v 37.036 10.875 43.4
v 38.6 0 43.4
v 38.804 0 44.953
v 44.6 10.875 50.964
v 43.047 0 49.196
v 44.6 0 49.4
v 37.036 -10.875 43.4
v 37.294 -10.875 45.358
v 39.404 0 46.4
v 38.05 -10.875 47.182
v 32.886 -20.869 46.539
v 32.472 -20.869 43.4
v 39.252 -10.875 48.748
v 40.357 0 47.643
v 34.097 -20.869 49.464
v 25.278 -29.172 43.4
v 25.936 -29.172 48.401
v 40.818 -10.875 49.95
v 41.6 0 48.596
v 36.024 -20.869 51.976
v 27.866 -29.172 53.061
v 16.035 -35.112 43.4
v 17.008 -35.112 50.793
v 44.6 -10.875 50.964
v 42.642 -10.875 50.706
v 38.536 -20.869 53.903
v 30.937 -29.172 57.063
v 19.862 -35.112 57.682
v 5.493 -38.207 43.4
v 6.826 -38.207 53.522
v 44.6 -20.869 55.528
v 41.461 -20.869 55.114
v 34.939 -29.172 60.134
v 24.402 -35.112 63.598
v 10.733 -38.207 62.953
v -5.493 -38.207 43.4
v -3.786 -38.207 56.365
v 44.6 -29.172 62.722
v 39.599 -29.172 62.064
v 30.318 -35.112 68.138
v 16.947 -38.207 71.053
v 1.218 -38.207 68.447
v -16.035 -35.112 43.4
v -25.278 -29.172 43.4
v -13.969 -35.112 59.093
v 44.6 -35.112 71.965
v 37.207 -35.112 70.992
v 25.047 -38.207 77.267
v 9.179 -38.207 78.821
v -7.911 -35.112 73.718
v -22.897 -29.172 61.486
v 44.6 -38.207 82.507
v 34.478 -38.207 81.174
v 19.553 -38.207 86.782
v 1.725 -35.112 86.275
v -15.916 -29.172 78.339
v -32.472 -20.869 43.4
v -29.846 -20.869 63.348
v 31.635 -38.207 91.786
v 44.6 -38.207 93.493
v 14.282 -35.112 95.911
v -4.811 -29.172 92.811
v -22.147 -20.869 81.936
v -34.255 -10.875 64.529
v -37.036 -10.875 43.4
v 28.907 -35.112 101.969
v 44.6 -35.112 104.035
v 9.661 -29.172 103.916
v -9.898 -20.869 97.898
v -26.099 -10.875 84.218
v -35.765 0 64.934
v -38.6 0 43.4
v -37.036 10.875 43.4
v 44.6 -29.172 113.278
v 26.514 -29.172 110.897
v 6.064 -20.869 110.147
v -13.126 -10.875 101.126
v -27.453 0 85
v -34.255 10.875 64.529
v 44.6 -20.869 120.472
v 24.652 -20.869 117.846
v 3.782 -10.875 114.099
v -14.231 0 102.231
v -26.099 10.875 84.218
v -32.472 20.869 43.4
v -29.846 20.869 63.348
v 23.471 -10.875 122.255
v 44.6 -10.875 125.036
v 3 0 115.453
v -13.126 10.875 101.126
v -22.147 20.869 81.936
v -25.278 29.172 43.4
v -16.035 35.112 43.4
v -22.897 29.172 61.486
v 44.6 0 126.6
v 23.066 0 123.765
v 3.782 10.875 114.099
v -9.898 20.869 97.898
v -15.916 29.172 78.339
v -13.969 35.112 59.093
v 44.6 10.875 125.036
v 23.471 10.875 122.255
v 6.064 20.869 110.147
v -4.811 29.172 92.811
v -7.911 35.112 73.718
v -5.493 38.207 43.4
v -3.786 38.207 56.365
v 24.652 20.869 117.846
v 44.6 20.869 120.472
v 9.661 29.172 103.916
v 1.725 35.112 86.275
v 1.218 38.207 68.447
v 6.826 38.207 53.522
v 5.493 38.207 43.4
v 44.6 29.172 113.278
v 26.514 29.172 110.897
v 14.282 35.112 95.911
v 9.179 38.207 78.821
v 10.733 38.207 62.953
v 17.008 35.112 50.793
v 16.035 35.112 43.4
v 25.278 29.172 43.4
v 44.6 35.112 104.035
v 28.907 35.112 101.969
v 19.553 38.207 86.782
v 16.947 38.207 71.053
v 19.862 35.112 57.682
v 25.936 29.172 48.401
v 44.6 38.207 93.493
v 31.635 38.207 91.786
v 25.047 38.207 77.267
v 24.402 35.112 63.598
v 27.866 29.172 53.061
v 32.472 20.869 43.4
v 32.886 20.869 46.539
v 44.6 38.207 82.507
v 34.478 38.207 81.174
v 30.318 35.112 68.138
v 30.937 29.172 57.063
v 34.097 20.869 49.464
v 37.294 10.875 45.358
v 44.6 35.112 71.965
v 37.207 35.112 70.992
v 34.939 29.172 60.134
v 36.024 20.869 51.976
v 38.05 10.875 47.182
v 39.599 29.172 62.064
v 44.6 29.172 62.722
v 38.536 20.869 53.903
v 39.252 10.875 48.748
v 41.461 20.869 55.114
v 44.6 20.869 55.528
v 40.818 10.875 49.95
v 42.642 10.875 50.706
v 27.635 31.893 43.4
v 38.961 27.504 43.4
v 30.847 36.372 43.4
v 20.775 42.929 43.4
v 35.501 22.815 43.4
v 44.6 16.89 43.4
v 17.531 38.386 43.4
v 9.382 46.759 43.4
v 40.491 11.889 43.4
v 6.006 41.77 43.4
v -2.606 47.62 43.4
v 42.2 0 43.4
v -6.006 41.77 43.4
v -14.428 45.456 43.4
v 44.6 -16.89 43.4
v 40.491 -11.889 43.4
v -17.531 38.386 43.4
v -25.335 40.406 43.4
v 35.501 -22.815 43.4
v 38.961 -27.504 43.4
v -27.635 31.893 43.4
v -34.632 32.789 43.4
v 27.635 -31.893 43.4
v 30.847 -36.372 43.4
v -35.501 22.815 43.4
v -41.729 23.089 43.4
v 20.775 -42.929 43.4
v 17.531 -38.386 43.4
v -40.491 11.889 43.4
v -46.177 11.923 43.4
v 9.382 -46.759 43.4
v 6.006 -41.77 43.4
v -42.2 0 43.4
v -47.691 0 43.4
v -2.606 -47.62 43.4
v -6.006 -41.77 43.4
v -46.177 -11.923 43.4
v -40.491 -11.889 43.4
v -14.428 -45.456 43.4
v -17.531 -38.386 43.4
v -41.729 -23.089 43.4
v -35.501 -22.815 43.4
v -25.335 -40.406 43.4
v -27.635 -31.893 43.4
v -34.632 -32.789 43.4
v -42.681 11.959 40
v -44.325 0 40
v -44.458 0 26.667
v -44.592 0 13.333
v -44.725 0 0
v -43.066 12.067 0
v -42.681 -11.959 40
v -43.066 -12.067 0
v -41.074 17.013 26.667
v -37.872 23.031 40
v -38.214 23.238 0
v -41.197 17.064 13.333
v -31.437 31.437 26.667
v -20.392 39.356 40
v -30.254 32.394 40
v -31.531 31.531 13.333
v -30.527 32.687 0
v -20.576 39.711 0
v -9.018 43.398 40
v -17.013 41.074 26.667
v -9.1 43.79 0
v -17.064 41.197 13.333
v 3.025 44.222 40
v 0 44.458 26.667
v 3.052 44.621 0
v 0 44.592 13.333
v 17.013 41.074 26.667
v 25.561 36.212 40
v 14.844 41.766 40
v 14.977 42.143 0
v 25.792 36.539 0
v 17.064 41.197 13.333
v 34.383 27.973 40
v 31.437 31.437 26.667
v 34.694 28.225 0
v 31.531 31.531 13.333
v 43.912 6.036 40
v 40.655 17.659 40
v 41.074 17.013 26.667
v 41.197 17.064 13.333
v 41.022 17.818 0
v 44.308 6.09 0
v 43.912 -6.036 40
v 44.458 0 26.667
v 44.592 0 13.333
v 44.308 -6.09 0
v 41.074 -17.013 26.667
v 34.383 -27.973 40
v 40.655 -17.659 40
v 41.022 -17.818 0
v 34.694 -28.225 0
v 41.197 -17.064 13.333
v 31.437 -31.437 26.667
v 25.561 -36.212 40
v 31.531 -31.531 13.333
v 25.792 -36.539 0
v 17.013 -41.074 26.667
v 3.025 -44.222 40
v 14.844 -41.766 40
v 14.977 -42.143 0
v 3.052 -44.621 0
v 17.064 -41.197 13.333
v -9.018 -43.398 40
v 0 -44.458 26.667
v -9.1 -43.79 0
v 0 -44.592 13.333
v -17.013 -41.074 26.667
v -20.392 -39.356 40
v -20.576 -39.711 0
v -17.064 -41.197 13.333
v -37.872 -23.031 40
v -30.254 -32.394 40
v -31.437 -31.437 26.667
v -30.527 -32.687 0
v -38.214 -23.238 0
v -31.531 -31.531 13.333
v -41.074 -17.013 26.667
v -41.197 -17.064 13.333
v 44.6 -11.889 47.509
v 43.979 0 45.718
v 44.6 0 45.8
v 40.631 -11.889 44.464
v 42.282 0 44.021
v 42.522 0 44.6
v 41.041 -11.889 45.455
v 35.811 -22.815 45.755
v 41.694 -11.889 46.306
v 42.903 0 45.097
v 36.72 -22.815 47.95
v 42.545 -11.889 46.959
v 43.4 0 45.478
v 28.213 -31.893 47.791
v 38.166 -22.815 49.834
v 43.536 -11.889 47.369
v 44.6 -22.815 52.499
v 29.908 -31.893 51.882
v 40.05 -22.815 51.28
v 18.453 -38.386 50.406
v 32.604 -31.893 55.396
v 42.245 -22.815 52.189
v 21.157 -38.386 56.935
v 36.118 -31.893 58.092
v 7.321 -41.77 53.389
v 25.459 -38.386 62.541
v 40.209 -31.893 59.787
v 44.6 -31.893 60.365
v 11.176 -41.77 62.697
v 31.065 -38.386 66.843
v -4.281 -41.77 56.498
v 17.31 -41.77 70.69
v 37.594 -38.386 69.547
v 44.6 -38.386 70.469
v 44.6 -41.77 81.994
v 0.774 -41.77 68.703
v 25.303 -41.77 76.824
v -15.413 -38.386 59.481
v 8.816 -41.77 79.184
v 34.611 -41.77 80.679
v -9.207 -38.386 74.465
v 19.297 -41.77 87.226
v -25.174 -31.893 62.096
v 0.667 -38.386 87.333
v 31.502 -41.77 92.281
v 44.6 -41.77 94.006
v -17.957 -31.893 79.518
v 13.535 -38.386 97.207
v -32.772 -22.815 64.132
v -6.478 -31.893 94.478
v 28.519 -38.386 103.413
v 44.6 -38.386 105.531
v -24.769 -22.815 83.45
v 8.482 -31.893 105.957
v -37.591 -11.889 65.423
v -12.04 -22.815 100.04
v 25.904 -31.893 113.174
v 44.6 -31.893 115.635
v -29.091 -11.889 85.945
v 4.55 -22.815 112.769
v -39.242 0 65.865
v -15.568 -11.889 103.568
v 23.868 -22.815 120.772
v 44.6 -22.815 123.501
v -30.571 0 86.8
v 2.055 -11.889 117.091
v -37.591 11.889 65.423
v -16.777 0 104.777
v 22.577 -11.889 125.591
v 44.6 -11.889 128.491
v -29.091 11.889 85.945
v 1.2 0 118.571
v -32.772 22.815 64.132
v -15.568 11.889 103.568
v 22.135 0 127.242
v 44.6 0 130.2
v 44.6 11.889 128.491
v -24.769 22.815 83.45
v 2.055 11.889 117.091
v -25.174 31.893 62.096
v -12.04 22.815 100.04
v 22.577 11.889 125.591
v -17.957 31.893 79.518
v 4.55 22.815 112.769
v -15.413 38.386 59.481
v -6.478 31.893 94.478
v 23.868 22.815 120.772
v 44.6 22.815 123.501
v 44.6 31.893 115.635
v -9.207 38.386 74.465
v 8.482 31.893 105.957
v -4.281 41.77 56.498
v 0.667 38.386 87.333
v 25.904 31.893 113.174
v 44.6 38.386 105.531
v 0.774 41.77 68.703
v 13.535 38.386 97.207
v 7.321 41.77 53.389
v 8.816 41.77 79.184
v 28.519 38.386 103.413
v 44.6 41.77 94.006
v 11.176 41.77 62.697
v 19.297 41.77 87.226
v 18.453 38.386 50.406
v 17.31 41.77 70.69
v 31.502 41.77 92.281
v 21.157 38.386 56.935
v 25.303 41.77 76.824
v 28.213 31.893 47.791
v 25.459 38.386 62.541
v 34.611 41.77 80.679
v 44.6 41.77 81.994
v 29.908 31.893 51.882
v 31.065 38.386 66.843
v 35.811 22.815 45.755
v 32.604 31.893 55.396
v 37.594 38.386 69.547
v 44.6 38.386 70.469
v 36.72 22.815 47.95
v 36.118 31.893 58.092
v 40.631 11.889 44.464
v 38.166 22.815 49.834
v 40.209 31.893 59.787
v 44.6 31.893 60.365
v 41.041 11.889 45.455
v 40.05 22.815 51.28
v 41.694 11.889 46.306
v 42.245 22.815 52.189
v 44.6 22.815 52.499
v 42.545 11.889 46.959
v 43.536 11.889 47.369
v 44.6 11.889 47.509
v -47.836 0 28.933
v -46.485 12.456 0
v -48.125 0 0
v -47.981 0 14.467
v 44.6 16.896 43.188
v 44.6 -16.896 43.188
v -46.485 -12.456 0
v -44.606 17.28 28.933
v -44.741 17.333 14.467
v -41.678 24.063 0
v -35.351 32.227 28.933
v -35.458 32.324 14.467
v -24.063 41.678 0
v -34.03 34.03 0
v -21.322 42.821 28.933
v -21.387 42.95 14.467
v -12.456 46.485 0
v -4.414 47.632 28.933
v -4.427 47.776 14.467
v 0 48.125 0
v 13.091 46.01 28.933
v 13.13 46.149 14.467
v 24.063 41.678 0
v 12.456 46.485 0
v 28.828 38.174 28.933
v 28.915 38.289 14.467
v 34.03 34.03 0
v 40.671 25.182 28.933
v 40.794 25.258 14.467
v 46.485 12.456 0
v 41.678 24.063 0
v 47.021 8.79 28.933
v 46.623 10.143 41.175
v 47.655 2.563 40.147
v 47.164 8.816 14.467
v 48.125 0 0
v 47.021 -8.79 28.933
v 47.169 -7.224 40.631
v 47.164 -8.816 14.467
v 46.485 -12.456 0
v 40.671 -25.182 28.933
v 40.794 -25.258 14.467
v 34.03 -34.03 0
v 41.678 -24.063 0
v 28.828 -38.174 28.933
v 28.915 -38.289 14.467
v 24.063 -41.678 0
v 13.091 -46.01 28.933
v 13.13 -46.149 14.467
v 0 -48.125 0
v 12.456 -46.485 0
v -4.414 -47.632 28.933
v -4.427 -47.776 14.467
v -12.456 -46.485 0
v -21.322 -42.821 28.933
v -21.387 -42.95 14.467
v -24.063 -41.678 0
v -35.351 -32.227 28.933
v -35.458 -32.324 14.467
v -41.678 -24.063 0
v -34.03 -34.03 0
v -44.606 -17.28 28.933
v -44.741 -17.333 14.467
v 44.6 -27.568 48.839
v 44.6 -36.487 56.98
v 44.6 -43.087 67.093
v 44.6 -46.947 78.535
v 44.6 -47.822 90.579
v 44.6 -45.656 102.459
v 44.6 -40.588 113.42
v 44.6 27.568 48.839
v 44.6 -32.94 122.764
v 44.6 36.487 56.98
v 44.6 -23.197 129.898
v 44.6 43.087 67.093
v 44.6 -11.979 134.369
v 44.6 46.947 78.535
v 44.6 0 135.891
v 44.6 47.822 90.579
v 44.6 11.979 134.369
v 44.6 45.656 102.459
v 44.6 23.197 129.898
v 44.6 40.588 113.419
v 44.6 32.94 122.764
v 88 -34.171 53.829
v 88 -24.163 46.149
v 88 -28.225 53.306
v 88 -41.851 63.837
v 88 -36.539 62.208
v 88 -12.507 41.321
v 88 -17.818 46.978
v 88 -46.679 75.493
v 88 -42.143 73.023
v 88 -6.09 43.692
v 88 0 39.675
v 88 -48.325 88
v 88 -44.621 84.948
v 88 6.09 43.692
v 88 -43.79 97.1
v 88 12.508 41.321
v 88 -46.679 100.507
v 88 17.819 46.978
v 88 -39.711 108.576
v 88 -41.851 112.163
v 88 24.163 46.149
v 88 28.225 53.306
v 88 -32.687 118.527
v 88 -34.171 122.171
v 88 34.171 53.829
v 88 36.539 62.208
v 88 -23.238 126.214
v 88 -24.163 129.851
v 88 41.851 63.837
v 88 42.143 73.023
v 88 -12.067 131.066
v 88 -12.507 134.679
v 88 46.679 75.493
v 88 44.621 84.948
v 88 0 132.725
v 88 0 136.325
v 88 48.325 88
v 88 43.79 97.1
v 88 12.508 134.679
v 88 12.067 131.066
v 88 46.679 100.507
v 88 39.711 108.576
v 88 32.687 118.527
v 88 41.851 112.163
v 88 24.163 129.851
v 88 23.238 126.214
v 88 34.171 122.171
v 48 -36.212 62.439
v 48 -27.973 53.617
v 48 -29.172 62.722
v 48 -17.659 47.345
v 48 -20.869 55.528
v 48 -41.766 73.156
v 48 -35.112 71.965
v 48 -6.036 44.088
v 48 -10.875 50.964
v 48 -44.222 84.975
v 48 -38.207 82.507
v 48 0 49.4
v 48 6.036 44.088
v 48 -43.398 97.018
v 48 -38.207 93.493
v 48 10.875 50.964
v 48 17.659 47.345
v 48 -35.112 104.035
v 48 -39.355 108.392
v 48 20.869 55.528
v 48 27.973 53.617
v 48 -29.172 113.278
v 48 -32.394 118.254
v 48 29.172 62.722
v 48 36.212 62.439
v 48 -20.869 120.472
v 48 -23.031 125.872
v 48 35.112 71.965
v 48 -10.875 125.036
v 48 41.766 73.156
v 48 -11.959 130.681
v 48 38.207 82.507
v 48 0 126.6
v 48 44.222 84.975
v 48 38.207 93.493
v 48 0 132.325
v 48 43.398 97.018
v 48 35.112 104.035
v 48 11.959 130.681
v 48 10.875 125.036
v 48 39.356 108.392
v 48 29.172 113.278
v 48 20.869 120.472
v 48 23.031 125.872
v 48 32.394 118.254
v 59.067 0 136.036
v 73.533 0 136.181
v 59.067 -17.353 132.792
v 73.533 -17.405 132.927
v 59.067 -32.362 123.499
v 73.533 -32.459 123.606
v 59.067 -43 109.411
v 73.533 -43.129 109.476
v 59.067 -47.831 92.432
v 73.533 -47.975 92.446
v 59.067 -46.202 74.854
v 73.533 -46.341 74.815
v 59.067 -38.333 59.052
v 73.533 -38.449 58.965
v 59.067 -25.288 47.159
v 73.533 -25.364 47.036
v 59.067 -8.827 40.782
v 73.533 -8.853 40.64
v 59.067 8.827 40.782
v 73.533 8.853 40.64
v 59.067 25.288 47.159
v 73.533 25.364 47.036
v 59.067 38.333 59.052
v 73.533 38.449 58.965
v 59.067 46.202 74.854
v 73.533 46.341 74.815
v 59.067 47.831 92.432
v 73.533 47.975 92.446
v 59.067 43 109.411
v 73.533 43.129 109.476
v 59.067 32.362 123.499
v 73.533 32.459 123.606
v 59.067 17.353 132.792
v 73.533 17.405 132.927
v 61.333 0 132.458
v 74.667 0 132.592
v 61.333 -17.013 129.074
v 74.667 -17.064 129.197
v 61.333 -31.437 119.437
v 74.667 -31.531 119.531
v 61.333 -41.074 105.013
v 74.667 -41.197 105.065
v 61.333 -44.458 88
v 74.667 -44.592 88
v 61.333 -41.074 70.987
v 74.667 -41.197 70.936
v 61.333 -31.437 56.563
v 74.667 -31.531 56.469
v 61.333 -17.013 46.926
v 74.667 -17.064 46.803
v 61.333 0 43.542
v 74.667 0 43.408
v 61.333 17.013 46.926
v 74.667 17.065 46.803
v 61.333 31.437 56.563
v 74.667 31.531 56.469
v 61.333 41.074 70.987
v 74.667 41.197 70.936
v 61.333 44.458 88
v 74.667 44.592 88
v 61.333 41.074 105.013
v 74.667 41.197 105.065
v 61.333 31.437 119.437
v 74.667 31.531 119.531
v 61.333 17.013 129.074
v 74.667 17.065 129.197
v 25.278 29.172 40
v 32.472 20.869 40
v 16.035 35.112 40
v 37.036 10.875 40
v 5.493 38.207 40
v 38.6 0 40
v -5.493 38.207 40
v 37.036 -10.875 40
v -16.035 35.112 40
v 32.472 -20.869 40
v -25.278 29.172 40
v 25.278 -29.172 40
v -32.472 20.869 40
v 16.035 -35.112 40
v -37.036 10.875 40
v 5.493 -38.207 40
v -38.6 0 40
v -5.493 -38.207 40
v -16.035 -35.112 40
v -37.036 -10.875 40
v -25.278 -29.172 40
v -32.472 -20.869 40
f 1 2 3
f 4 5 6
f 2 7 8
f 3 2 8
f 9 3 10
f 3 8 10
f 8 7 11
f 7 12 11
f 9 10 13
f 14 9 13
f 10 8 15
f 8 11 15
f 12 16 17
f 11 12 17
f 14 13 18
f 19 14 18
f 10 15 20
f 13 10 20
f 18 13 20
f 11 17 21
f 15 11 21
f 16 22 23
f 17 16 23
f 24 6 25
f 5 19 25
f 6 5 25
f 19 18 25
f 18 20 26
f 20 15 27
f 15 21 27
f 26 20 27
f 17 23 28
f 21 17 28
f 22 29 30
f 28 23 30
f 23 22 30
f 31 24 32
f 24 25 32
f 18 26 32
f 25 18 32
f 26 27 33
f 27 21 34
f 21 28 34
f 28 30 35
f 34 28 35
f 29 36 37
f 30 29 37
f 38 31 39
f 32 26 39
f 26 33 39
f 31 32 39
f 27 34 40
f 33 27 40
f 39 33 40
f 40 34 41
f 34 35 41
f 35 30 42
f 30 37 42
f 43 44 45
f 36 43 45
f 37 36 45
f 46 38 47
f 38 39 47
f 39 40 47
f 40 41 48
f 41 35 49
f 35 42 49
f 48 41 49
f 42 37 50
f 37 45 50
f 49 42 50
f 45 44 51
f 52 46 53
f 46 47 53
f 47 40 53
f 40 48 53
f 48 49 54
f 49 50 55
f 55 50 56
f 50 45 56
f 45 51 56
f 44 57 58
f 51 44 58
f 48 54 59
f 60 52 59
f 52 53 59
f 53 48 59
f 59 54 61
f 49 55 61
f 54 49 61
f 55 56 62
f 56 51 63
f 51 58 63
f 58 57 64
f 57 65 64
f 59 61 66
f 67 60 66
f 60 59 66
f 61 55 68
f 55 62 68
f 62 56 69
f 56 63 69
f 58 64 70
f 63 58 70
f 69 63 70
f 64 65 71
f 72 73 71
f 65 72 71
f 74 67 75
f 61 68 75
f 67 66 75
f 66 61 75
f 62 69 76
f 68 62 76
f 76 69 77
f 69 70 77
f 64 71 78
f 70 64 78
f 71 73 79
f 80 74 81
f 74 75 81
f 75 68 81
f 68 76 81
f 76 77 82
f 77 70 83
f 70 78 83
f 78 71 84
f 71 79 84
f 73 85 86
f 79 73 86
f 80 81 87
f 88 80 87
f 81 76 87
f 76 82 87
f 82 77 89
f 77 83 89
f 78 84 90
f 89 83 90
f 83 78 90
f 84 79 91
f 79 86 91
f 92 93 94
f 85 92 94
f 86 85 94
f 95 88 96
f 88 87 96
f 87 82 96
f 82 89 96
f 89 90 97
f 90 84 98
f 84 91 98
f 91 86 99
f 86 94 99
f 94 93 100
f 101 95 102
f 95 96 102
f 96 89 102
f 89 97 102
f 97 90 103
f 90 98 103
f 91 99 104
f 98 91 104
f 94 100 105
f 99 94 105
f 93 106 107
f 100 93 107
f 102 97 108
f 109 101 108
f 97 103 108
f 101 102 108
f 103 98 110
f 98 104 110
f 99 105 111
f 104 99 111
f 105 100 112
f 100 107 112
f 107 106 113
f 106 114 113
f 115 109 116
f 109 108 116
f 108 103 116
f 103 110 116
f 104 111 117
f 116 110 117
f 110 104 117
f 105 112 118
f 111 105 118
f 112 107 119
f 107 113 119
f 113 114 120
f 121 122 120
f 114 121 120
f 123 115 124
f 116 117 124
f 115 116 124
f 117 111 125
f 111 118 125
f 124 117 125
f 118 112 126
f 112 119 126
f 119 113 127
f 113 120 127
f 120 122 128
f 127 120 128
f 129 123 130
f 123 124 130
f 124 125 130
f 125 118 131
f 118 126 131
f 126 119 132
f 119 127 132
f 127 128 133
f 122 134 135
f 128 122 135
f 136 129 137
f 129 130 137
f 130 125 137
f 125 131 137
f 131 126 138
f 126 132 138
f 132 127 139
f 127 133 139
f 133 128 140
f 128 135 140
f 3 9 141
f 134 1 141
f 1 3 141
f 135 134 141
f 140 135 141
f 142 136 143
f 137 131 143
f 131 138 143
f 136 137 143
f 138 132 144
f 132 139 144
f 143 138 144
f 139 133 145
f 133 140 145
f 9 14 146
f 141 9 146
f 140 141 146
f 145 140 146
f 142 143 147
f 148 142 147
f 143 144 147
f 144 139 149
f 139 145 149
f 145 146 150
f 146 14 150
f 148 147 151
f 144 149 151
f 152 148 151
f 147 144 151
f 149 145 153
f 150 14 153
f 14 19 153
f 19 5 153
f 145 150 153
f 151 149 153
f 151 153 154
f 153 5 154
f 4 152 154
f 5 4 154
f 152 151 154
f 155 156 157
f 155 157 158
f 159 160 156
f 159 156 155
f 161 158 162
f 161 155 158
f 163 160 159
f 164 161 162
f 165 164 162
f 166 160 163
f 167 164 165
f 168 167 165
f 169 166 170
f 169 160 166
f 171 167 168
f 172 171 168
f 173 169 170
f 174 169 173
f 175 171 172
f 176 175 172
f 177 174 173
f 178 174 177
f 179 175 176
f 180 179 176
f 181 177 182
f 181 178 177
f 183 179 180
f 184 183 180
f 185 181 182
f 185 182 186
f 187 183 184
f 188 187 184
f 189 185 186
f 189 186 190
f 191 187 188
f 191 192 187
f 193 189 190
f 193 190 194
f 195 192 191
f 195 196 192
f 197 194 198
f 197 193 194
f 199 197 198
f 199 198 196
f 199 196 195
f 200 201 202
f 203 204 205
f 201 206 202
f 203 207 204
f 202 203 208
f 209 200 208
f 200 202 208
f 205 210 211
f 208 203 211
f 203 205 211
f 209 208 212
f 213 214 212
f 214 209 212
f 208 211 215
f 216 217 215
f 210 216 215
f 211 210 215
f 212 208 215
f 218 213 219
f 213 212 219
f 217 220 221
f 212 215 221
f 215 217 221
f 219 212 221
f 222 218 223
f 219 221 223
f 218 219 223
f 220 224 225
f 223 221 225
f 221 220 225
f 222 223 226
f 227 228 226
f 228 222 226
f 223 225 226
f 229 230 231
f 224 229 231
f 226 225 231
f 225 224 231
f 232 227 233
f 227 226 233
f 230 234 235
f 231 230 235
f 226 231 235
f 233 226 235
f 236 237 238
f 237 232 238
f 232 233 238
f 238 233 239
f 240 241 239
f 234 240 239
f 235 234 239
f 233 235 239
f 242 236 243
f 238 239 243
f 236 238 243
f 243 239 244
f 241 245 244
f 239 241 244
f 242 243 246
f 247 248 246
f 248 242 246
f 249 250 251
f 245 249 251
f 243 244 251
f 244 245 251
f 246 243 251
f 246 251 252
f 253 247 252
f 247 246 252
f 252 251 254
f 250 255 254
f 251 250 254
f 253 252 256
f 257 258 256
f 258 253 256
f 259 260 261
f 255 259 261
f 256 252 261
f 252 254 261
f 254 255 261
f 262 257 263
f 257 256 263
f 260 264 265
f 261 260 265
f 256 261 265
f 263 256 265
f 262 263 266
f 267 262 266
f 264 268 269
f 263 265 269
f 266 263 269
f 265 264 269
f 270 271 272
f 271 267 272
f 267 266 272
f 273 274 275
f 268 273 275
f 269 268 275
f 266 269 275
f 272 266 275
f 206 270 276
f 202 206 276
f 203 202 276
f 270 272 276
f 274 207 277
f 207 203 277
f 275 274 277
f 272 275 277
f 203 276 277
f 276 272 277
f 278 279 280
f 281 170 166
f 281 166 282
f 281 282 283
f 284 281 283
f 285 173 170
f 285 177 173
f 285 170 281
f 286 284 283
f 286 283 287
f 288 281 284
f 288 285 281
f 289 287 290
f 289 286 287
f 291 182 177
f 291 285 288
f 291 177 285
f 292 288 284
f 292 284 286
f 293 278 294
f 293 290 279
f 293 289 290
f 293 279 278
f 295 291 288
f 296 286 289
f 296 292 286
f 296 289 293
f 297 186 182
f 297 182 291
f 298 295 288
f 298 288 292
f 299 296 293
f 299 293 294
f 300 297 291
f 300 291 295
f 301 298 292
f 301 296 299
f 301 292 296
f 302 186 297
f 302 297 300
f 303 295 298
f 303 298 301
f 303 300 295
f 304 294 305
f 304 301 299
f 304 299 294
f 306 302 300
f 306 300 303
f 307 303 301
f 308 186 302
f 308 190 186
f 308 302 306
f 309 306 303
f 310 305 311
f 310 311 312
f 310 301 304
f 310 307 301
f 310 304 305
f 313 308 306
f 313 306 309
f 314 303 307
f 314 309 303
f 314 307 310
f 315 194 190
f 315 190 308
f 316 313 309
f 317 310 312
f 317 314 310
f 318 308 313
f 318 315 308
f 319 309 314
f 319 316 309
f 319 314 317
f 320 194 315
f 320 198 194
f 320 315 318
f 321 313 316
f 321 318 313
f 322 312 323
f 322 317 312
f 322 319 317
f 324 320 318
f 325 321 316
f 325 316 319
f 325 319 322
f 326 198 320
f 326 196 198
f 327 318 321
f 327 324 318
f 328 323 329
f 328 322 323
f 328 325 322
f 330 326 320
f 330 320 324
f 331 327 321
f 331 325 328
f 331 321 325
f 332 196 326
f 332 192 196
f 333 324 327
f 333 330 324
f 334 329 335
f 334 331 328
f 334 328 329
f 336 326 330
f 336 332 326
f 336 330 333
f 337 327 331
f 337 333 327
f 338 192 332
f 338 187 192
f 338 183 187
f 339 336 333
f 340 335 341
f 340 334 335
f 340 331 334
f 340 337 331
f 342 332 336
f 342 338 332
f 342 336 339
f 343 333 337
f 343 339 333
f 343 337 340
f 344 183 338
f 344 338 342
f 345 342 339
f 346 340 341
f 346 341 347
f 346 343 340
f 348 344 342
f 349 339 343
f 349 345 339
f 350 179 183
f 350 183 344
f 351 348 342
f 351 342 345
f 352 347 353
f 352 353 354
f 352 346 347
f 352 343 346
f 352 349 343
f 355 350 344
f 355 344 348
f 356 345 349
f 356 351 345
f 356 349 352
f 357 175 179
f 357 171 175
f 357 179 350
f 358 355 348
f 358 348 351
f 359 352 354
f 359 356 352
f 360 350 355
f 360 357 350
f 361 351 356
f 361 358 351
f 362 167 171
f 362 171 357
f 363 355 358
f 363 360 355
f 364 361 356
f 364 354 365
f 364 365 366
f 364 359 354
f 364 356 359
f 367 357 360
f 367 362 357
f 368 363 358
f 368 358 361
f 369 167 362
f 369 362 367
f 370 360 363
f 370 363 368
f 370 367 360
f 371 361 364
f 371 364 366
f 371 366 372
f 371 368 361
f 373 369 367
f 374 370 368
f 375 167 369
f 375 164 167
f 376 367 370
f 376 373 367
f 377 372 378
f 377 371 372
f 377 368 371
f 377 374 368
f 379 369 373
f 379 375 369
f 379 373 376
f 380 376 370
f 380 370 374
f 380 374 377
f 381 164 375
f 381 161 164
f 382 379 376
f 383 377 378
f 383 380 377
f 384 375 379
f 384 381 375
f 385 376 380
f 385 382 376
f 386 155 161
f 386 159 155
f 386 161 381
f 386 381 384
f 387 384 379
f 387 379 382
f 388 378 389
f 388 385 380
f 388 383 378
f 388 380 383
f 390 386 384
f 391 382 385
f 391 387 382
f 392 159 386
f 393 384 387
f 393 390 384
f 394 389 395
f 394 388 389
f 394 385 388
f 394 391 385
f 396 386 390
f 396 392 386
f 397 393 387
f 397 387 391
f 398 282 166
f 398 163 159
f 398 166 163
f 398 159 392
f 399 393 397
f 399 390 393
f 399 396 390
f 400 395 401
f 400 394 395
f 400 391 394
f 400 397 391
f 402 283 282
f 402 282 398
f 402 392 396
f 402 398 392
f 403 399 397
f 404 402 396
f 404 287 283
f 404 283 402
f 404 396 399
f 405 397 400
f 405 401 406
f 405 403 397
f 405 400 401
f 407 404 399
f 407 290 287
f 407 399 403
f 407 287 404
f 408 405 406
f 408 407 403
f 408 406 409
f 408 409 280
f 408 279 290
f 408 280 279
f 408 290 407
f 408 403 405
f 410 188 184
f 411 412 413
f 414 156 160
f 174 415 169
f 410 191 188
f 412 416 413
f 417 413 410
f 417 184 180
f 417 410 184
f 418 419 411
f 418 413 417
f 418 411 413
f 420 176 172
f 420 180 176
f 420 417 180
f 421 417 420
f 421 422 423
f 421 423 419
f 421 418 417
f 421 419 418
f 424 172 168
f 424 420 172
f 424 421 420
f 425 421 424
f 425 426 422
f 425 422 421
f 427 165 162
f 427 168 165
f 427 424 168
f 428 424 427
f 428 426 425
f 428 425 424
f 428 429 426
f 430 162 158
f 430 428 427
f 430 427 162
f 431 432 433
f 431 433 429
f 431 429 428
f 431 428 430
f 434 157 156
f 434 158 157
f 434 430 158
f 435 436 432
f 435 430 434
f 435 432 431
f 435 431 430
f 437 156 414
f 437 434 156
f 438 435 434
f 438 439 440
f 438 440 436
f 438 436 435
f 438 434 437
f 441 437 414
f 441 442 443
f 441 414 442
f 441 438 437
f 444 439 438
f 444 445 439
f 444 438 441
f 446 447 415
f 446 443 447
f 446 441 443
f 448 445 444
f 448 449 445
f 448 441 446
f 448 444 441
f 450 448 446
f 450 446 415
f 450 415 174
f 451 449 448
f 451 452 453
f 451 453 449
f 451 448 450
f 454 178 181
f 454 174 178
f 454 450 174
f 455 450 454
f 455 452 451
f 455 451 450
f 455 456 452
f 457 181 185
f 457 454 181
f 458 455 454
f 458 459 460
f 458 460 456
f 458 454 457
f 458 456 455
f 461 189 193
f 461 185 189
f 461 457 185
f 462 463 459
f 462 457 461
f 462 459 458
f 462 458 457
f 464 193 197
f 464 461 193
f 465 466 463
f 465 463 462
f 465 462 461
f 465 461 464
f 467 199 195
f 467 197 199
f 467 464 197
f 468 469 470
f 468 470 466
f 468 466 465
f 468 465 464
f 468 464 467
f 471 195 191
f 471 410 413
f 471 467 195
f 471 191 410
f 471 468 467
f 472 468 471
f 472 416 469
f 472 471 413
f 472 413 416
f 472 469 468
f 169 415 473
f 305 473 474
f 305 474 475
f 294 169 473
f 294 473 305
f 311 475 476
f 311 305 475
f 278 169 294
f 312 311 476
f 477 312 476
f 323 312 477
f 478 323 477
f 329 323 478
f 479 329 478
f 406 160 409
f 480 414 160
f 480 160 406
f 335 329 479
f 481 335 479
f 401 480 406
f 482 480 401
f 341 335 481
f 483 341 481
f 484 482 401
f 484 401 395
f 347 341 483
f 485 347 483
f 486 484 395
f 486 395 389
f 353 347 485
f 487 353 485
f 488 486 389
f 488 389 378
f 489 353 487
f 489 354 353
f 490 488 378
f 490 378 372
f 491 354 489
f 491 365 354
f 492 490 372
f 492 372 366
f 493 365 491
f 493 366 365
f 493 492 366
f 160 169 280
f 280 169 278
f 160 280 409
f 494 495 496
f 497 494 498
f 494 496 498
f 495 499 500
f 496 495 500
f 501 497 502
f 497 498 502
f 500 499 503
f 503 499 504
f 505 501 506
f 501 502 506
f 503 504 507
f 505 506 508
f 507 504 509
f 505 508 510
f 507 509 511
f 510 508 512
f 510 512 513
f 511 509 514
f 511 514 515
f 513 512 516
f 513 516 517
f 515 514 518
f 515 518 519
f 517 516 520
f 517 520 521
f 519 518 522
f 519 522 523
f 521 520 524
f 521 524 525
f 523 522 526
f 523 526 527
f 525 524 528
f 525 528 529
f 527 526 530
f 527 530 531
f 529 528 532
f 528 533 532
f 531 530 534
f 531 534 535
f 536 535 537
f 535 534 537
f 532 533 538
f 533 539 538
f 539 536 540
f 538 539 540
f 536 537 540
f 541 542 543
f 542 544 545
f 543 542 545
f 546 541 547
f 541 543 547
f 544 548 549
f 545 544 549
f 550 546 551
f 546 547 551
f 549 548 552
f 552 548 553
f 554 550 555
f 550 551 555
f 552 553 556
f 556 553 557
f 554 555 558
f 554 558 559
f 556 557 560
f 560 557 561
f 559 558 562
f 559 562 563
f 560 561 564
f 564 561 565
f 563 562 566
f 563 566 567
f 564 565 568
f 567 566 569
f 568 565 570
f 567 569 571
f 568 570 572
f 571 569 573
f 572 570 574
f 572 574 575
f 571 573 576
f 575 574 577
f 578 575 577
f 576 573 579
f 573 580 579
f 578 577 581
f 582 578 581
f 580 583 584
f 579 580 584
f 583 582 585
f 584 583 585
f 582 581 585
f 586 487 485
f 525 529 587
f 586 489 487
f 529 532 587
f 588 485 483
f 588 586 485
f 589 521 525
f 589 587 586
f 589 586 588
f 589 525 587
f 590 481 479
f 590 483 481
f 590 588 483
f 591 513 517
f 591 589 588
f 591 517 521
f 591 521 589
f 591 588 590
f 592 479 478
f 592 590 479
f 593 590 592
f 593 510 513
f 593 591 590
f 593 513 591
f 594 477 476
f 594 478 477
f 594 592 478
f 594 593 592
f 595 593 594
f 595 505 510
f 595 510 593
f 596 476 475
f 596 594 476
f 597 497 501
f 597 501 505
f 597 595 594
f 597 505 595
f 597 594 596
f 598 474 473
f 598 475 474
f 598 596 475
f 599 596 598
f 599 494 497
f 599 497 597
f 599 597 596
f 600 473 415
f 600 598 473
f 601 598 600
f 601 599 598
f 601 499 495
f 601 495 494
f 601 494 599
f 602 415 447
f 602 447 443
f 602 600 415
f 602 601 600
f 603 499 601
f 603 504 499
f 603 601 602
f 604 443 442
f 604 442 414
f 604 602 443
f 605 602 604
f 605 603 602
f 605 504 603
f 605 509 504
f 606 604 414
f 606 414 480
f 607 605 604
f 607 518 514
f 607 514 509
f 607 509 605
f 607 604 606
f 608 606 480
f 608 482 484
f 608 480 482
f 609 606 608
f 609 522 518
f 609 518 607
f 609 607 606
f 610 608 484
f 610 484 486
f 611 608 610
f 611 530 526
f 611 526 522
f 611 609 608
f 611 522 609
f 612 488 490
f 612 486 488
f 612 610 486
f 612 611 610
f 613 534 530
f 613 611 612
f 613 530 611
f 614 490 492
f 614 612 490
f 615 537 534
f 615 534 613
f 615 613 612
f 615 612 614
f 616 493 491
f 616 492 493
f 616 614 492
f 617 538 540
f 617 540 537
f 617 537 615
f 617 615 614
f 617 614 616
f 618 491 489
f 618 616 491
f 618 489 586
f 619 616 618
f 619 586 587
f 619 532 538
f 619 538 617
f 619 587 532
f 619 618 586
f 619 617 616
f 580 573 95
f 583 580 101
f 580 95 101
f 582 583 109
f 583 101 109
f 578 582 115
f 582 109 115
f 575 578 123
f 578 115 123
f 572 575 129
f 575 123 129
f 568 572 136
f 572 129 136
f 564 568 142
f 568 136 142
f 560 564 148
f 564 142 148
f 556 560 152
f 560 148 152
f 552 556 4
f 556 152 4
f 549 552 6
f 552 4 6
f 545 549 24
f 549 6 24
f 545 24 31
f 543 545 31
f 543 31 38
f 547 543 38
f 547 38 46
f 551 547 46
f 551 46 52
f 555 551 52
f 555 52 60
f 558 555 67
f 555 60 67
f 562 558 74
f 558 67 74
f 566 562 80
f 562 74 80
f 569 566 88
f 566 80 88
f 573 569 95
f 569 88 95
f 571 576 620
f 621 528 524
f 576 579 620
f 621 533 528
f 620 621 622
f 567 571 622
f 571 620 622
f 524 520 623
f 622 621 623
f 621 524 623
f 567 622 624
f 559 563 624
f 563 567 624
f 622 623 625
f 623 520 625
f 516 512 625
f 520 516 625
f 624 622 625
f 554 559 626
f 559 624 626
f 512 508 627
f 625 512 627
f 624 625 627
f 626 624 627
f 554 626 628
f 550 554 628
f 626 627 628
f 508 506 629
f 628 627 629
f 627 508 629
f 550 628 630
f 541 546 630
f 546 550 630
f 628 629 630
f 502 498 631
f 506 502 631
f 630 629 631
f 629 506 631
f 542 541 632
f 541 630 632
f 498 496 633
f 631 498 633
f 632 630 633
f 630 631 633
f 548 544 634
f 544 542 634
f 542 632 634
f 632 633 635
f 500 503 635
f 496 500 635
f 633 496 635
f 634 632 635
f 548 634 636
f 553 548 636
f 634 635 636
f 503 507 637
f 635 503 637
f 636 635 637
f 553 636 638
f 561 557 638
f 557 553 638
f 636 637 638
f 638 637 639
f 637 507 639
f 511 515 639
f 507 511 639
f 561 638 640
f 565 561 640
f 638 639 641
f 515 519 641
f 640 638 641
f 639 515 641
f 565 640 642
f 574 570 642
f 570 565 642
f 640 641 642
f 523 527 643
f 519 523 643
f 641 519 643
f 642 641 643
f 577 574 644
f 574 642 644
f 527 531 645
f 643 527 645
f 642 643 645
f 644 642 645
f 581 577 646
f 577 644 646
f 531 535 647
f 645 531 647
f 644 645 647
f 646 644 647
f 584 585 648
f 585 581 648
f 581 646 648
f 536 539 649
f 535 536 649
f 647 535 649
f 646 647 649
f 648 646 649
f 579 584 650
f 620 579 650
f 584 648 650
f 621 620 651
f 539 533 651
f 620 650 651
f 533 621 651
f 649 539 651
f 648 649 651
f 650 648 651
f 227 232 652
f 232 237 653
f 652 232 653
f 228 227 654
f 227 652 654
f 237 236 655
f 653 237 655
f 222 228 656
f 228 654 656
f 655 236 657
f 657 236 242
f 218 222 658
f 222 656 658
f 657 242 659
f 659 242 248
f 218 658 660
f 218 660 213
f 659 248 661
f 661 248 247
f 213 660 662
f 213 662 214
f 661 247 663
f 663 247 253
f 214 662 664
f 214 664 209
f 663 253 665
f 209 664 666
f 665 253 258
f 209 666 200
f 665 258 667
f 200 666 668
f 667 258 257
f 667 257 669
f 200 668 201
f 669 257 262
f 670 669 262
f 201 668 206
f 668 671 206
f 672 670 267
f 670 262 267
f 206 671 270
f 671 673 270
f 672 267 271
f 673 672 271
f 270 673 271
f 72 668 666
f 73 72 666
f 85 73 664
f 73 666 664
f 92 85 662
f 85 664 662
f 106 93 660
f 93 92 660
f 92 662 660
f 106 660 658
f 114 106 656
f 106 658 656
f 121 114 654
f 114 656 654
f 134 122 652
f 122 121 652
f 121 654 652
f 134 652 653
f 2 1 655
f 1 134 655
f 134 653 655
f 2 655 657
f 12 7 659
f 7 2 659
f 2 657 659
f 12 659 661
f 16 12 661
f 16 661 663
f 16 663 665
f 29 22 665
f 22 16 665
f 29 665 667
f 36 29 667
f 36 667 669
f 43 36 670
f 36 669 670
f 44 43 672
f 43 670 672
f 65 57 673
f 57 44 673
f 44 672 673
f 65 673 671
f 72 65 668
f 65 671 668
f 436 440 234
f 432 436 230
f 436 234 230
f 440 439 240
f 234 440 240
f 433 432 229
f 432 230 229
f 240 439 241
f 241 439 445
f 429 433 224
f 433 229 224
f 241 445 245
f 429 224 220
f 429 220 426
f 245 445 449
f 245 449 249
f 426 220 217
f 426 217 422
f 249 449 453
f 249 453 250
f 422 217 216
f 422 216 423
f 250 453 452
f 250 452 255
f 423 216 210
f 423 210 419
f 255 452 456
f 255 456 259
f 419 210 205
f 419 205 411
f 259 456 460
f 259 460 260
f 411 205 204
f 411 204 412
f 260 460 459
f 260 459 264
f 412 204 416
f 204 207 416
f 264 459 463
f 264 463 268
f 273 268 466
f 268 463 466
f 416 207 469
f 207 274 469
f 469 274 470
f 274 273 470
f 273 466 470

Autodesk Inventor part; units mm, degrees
ref_plane "YZ Plane" through (0, 0, 0) normal (1, 0, 0) x (0, 1, 0)
ref_plane "XZ Plane" through (0, 0, 0) normal (0, 1, 0) x (-1, 0, 0)
ref_plane "XY Plane" through (0, 0, 0) normal (0, 0, 1) x (1, 0, 0)
sketch "Sketch1" plane through (0, 0, 0) normal (0, 1, 0) x (-1, 0, 0)
  line L0 (0, 0) -> (0, 43.4)
  line L1 (48.1252, 0) -> (0, 0)
  line L2 (0, 43.4) -> (47.6912, 43.4)
  line L3 (44.325, 40) -> (44.725, 0)
  line L4 (48.1252, 0) -> (47.6912, 43.4)
  line L5 (38.6, 43.4) -> (38.6, 40)
  line L6 (38.6, 40) -> (44.325, 40)
  line L7 (38.6, 40) -> (0, 40) construction
  dimension "d0" = 89.45
  dimension "d3" = 88.65
  dimension "d4" = 3.4
  dimension "d5" = 40
  dimension "d6" = 3.4
  dimension "d7" = 77.2
revolve "Revolution1" add sketch "Sketch1" angle 360 about axis through (0, 0, 0) along (0, 0, 1) contours L3 L6 L5 L2 L4 L1
sketch "Sketch2" plane through (0, 0, 43.4) normal (0, 0, 1) x (1, 0, 0)
  circle A0 centre (0, 0) radius 47.6912 projected
  circle A1 centre (0, 0) radius 38.6 projected
  circle A2 centre (0, 0) radius 42.2
  circle A3 centre (0, 0) radius 38.6
  dimension "d8" = 77.2
  dimension "d9" = 3.6
sketch "Sketch3" plane through (0, 0, 0) normal (0, 1, 0) x (-1, 0, 0)
  arc A0 (0, 43.4) -> (-44.6, 88) centre (-44.6, 43.4) ccw
  dimension "d10" = 44.6
  dimension "d11" = 44.6
  dimension "d12" = 44.6
sweep "Sweep1" add profiles "Sketch2" path "Sketch3" contours A2
sketch "Sketch4" plane through (0, 0, 0) normal (0, 1, 0) x (-1, 0, 0)
  line L0 (-44.6, 49.4) -> (-44.6, 126.6) projected
  line L1 (-88, 88) -> (-44.6, 88)
  line L2 (-44.6, 88) -> (-44.6, 135.8912)
  line L3 (-44.6, 135.8912) -> (-88, 136.3252)
  line L4 (-88, 136.3252) -> (-88, 88)
  line L5 (-88, 132.725) -> (-48, 132.325)
  line L6 (-48, 135.9252) -> (-48, 126.6)
  line L7 (-48, 126.6) -> (-44.6, 126.6)
  line L8 (-48, 126.6) -> (-48, 88) construction
  dimension "d14" = 3.6
  dimension "d15" = 40
  dimension "d16" = 3.4
  dimension "d17" = 89.45
  dimension "d18" = 88.65
  dimension "d19" = 77.2
revolve "Revolution2" add sketch "Sketch4" angle 360 about axis through (88, 0, 88) along (-1, 0, 0) contours L7 L6 L3 L2 | L4 L3 L6 L5
equation "\"d0\" = d1"
equation "\"d3\" = d2"
equation "\"d4\" = t2"
equation "\"d5\" = l1"
equation "\"d6\" = t2"
equation "\"d7\" = d"
equation "\"d8\" = d"
equation "\"d9\" = t1"
equation "\"d10\" = Z - t2"
equation "\"d11\" = Z - t2"
equation "\"d12\" = Z - t2"
equation "\"d14\" = t1"
equation "\"d15\" = l1"
equation "\"d16\" = t2"
equation "\"d17\" = d1"
equation "\"d18\" = d2"
equation "\"d19\" = d"
equation "\"d\" = 77.2"
equation "\"d1\" = 89.45"
equation "\"d2\" = 88.65"
equation "\"l1\" = 40"
equation "\"L\" = 88"
equation "\"t1\" = 3.6"
equation "\"t2\" = 3.4"
equation "\"Z\" = 48"
properties part number "JIS K 6739 90 Deg Elbow (DL) 75" material "PVC, Unplasticized"
